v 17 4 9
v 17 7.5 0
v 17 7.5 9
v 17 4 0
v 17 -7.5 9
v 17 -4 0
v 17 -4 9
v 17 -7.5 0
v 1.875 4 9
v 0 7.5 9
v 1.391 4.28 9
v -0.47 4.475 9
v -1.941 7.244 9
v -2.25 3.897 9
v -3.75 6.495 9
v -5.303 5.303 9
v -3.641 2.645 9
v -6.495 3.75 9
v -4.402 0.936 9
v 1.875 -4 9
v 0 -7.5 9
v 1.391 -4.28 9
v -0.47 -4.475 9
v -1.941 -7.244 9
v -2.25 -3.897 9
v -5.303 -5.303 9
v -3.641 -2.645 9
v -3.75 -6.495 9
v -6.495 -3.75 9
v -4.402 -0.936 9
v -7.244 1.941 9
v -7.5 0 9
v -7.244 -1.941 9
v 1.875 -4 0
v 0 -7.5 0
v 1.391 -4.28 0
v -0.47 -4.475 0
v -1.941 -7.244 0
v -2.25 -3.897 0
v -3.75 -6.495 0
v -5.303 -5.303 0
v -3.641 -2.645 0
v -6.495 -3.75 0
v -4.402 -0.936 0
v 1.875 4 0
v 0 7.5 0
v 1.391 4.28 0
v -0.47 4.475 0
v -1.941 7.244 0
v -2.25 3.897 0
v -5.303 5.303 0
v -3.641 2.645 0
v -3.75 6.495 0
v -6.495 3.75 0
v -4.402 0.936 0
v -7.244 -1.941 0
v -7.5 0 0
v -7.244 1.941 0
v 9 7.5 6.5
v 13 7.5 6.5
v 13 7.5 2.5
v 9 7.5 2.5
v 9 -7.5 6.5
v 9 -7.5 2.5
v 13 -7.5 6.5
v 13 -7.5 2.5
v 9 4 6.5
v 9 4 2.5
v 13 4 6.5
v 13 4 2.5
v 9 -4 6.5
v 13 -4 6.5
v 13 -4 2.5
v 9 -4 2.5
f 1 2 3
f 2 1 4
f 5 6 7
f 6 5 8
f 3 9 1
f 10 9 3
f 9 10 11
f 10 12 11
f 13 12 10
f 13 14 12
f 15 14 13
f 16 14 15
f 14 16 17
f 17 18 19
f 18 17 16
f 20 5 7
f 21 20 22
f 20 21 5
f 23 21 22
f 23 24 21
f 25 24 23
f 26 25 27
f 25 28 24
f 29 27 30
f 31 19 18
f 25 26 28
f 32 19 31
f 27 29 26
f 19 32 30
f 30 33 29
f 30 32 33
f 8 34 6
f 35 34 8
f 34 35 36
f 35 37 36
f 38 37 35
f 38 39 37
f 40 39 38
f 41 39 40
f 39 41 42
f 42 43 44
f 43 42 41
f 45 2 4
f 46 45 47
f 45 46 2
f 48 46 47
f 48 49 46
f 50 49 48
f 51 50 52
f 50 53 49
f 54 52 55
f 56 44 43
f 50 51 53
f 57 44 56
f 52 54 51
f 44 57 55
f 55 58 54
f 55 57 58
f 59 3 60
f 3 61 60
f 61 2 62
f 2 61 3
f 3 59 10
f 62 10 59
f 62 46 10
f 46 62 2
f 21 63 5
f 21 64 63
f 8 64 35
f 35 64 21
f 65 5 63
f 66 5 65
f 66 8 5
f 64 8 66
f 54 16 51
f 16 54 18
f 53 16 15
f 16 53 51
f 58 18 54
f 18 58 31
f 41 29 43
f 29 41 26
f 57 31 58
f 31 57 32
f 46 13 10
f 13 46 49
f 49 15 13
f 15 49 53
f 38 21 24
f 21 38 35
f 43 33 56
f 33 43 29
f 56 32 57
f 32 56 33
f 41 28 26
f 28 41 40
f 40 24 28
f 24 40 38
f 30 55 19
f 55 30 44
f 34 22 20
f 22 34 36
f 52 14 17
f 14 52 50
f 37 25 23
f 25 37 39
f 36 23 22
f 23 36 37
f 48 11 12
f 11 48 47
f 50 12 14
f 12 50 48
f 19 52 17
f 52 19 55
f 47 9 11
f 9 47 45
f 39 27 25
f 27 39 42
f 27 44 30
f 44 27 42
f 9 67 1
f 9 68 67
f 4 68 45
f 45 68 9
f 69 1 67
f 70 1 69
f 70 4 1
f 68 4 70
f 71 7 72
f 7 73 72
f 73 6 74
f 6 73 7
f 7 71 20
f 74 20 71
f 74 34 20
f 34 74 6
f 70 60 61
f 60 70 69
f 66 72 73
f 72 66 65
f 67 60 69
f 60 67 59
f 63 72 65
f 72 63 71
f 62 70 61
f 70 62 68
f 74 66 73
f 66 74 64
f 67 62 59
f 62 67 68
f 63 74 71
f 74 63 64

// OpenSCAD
module clip(rod=8, h=9, t=3, in=1) {
	id = rod+1;
	l = id+4+4;
	id2 = id-in;
	difference() {
		union() {
			translate([0,-id/2-t,0])
			cube([l, id+2*t, h]);
			cylinder(r=t+id/2, h=h);
		}
		translate([0,0,-1]) {
			#cylinder(r=id/2, h=h+2);
			translate([0, -id2/2, 0])
			cube([l+1, id2, h+2]);
		}
		translate([id, -15, h/2-2])
		#cube([4,30, 4]);
	}
}

clip();
